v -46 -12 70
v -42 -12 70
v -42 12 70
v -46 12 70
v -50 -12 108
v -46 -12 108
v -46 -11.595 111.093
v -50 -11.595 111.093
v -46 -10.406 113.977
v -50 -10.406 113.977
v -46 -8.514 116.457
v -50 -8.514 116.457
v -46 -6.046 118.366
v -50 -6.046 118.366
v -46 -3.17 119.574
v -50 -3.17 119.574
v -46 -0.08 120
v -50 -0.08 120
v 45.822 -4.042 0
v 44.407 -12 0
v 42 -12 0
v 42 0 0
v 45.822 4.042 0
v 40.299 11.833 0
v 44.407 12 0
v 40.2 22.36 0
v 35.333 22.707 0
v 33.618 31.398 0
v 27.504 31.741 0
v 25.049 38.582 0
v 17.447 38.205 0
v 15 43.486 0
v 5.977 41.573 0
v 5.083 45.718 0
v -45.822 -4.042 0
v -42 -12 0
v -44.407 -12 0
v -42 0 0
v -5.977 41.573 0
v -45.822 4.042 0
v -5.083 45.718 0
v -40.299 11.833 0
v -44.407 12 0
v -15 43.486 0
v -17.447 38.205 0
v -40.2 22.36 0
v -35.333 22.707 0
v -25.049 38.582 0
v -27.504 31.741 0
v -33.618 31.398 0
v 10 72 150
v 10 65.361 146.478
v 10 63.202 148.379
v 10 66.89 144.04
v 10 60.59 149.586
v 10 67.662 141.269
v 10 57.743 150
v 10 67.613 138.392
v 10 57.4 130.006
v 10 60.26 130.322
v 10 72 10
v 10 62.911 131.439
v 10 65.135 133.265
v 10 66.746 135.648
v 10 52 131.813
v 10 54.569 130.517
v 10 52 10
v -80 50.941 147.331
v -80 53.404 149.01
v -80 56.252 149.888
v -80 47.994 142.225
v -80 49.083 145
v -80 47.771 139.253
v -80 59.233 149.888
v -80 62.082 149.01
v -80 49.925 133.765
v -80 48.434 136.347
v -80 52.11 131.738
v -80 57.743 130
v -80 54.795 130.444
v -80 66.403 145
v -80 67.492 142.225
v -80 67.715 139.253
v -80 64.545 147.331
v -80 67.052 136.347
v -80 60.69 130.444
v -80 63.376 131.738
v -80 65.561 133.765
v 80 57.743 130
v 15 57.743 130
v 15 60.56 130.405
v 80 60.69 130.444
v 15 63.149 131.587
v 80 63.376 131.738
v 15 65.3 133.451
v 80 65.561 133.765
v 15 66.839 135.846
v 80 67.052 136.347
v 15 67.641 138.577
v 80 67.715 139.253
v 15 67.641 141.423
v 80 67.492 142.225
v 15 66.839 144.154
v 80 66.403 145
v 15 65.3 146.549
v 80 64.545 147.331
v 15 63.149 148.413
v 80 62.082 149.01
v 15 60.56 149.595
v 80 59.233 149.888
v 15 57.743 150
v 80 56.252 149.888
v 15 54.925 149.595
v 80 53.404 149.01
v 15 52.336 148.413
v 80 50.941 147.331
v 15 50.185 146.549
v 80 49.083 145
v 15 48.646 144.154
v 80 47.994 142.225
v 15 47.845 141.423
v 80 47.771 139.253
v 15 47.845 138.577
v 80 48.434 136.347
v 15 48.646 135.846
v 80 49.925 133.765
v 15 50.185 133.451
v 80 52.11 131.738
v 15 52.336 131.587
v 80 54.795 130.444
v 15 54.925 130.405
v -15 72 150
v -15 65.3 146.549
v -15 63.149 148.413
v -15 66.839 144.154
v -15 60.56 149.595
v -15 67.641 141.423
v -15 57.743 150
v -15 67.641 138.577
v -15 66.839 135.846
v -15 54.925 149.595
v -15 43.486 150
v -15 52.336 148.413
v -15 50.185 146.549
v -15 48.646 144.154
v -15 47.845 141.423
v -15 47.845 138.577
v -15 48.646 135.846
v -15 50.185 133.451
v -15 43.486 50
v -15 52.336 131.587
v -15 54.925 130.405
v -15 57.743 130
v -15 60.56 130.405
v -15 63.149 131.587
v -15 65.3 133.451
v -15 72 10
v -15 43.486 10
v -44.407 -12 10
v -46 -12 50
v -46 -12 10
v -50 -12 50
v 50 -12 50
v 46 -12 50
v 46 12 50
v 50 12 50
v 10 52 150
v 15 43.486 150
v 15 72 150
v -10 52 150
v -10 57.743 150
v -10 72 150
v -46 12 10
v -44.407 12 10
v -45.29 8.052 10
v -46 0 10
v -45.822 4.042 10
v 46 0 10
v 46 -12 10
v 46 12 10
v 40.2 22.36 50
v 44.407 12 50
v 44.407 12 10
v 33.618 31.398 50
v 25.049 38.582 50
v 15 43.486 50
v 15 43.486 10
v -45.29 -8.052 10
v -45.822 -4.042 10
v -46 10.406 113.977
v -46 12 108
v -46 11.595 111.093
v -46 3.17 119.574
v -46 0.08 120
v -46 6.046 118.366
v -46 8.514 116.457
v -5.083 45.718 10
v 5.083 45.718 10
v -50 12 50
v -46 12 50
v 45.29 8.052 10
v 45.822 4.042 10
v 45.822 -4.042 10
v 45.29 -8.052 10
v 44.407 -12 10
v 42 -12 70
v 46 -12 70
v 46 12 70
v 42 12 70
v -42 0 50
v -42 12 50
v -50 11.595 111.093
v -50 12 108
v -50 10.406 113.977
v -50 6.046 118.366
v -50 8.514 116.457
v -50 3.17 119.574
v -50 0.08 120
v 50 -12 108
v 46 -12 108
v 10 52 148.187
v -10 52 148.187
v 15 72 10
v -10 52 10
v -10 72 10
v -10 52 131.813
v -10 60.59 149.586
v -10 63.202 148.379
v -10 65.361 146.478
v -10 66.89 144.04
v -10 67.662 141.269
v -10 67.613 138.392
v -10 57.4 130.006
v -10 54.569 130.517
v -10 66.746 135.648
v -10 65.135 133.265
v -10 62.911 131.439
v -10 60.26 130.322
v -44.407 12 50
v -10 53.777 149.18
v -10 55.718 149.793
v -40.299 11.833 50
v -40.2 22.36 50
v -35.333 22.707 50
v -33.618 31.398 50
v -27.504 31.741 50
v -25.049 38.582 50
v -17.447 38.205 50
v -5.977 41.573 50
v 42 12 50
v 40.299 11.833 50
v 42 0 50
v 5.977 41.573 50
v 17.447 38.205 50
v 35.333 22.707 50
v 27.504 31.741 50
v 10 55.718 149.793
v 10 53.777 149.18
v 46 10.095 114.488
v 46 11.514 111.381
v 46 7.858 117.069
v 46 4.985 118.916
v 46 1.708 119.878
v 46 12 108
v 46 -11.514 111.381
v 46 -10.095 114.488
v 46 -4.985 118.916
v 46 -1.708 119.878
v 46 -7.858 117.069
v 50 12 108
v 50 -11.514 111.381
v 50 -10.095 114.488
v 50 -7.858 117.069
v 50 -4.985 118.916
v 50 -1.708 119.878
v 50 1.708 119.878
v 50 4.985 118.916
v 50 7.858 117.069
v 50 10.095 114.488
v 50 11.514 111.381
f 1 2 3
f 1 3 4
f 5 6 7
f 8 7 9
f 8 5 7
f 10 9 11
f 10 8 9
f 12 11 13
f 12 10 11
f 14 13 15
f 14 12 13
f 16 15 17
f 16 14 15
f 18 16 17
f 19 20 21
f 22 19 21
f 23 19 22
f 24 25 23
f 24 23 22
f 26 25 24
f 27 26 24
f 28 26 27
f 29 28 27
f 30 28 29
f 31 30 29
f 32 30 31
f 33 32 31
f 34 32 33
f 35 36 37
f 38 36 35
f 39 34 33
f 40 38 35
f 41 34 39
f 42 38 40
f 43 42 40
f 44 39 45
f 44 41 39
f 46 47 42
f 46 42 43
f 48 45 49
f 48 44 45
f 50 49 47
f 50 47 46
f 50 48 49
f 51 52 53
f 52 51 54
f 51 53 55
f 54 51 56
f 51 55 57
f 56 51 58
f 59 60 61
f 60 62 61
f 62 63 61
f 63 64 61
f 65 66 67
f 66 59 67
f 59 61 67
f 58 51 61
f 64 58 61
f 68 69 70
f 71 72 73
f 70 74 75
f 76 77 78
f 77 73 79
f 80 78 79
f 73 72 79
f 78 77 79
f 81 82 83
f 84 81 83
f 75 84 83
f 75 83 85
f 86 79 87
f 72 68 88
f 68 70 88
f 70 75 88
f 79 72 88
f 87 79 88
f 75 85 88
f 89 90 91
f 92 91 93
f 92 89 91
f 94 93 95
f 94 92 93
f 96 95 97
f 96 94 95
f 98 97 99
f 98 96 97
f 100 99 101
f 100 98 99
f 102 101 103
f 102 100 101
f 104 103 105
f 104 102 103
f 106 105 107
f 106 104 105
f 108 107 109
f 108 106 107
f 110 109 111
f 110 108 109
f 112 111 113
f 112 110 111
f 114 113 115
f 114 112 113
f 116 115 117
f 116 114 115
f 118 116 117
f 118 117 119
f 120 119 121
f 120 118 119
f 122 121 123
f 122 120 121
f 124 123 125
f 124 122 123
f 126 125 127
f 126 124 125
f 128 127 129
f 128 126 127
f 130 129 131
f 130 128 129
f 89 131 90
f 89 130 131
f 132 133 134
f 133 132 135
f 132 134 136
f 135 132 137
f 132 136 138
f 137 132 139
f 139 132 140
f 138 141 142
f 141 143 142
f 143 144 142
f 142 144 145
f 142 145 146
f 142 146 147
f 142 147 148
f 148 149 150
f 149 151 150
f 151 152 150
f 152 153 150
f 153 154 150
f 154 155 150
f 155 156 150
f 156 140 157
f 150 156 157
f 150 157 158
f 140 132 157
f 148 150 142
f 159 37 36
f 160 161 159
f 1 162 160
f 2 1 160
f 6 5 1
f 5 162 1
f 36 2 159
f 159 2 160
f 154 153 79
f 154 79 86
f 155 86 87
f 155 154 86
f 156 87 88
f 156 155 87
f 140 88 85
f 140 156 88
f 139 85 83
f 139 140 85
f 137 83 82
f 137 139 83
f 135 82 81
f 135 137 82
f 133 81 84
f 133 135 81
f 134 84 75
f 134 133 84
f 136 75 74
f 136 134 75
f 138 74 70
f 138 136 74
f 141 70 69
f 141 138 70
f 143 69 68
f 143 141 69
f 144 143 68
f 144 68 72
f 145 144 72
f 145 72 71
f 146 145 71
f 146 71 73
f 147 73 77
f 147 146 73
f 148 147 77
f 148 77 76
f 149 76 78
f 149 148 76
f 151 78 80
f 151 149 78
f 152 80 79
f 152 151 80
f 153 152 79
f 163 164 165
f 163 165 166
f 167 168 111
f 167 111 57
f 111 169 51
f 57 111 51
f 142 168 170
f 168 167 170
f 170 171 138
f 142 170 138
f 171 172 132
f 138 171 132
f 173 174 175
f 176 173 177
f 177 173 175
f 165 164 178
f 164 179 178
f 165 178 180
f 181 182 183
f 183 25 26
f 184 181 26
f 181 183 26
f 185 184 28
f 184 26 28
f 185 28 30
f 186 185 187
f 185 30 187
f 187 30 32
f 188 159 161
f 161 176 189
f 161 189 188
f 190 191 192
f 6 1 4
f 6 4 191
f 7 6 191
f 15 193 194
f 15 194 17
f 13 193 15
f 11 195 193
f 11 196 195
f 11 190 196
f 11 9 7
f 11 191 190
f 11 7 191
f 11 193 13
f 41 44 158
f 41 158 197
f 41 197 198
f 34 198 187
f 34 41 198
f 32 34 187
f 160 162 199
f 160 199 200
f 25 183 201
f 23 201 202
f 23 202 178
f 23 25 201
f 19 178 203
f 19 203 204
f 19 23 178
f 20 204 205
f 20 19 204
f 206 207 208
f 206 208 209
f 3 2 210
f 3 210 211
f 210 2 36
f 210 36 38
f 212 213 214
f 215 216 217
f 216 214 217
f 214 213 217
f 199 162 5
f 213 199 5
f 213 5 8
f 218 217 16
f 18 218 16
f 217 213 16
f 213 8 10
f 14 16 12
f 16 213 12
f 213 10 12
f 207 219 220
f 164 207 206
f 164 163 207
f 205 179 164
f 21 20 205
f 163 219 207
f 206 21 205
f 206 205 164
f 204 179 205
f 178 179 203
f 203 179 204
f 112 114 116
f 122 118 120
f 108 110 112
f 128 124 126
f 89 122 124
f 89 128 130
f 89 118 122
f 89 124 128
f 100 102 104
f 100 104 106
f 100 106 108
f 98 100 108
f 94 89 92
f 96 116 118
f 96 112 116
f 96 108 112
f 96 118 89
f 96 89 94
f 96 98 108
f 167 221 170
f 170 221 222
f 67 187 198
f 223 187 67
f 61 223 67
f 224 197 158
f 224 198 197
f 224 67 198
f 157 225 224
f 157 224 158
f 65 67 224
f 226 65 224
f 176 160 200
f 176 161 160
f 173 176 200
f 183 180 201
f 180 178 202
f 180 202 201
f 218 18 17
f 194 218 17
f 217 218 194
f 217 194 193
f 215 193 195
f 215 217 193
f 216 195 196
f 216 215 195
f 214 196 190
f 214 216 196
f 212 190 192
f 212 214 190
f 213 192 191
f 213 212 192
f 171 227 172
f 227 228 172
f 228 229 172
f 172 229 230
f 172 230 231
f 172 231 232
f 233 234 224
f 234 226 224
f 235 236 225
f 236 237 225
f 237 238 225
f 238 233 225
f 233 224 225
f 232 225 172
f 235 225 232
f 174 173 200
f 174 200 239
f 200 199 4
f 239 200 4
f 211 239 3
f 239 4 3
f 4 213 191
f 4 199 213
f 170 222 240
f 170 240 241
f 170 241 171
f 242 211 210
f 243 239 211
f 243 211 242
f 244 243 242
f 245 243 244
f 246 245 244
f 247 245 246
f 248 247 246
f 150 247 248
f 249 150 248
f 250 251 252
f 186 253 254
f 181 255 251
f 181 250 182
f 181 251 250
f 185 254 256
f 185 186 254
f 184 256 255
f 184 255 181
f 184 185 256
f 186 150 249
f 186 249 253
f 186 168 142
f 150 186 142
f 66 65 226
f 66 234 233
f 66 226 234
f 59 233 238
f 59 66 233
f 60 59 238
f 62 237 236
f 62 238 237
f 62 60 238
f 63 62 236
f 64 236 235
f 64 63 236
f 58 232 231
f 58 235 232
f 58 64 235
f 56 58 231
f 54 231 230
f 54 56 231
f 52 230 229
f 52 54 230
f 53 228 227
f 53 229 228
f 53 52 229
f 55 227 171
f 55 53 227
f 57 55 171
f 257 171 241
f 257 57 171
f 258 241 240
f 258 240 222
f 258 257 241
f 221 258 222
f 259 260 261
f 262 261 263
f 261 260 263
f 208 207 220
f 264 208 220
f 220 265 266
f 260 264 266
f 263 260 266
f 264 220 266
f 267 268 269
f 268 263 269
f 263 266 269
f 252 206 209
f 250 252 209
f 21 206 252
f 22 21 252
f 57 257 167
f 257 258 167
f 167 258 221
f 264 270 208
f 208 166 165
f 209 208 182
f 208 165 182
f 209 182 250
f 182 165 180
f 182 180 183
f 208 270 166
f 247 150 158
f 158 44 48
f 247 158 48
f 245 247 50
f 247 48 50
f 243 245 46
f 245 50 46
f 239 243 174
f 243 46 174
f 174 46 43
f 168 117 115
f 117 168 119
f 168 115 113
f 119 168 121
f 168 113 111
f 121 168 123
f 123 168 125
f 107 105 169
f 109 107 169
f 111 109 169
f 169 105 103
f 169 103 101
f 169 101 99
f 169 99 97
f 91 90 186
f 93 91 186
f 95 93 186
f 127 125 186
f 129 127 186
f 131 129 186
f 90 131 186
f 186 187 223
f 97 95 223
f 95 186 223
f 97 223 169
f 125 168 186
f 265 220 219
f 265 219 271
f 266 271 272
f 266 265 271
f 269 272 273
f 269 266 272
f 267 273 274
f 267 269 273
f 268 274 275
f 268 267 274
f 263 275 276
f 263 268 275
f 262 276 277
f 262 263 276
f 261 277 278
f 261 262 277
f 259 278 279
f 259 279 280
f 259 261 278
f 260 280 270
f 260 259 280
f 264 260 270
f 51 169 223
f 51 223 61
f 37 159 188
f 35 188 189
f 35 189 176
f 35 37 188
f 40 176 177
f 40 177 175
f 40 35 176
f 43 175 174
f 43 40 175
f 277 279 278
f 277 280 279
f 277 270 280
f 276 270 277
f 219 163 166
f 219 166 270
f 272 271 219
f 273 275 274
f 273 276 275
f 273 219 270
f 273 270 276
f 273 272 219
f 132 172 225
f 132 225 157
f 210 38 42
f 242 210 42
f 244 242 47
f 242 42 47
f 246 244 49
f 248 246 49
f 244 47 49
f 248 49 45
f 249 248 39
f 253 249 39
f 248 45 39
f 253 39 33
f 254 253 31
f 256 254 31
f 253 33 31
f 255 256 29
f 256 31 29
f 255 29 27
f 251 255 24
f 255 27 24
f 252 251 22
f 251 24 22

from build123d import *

# Parameters (mm, degrees)
EXTRUDE_1_DEPTH     = 50
SKETCH_3_W          = 4
SKETCH_3_H          = 24
EXTRUDE_2_DEPTH     = 70
SKETCH_5_R          = 80
SKETCH_5_R_2        = 46
CUT_EXTRUDE_2_DEPTH = 10
EXTRUDE_4_DEPTH     = 140
SKETCH_10_R         = 10
EXTRUDE_5_DEPTH     = 80
SKETCH_12_W         = 4
SKETCH_12_H         = 70
EXTRUDE_6_DEPTH     = 24
CUT_EXTRUDE_3_DEPTH = 131


with BuildPart() as part:
    # 草图2 → 凸台-拉伸1 (new body)
    with BuildSketch(Plane.XY):
        with BuildLine():
            Line((-46, 0), (-42, 0))
            ThreePointArc((-42, 0), (0, 42), (42, 0))
            Line((42, 0), (46, 0))
            ThreePointArc((46, 0), (37.456641601, 26.702059846), (15, 43.48562981))
            Line((15, 43.48562981), (15, 72))
            Line((15, 72), (10, 72))
            Line((10, 72), (10, 52))
            Line((10, 52), (-10, 52))
            Line((-10, 52), (-10, 72))
            Line((-10, 72), (-15, 72))
            Line((-15, 72), (-15, 43.48562981))
            ThreePointArc((-15, 43.48562981), (-37.456641601, 26.702059846), (-46, 0))
        make_face()
    extrude(amount=EXTRUDE_1_DEPTH)

    # 草图3 → 凸台-拉伸2 (add)
    with BuildSketch(Plane(origin=(0, 0, 0), x_dir=(-1, 0, 0), z_dir=(0, 0, -1))):
        with Locations((-44, 0)):
            Rectangle(SKETCH_3_W, SKETCH_3_H)
        with Locations((44, 0)):
            Rectangle(SKETCH_3_W, SKETCH_3_H)
    extrude(amount=-EXTRUDE_2_DEPTH)

    # 草图5 → 切除-拉伸2 (cut)
    with BuildSketch(Plane(origin=(0, 0, 0), x_dir=(-1, 0, 0), z_dir=(0, 0, -1))):
        Circle(SKETCH_5_R)
        Circle(SKETCH_5_R_2, mode=Mode.SUBTRACT)
    extrude(amount=-CUT_EXTRUDE_2_DEPTH, mode=Mode.SUBTRACT)

    # 草图9 → 凸台-拉伸4 (add)
    with BuildSketch(Plane(origin=(0, 0, 10), x_dir=(-1, 0, 0), z_dir=(0, 0, -1))):
        Polygon((-15, 72), (-15, 43.48562981), (15, 43.48562981), (15, 72), (10, 72), (10, 52), (-10, 52), (-10, 72), align=None)
    extrude(amount=-EXTRUDE_4_DEPTH)

    # 草图10 → 凸台-拉伸5 (add, symmetric)
    with BuildSketch(Plane(origin=(0, 0, 0), x_dir=(0, 0, -1), z_dir=(1, 0, 0))):
        with Locations((-140, 57.742814905)):
            Circle(SKETCH_10_R)
    extrude(amount=EXTRUDE_5_DEPTH, both=True)

    # 草图12 → 凸台-拉伸6 (add)
    with BuildSketch(Plane.XZ.offset(12)):
        with Locations((-48, 84.999732959)):
            Rectangle(SKETCH_12_W, SKETCH_12_H)
        with Locations((48, 85)):
            Rectangle(SKETCH_12_W, SKETCH_12_H)
    extrude(amount=-EXTRUDE_6_DEPTH)

    # 草图13 → 切除-拉伸3 (cut, through all)
    with BuildSketch(Plane.ZY.offset(50)):
        with BuildLine():
            Line((108, 12), (128.196913472, 12))
            Line((128.196913472, 12), (128.196913472, -12))
            Line((128.196913472, -12), (108, -12))
            ThreePointArc((108, -12), (120, 0), (108, 12))
        make_face()
    extrude(amount=-CUT_EXTRUDE_3_DEPTH, mode=Mode.SUBTRACT)


solid = part.part
